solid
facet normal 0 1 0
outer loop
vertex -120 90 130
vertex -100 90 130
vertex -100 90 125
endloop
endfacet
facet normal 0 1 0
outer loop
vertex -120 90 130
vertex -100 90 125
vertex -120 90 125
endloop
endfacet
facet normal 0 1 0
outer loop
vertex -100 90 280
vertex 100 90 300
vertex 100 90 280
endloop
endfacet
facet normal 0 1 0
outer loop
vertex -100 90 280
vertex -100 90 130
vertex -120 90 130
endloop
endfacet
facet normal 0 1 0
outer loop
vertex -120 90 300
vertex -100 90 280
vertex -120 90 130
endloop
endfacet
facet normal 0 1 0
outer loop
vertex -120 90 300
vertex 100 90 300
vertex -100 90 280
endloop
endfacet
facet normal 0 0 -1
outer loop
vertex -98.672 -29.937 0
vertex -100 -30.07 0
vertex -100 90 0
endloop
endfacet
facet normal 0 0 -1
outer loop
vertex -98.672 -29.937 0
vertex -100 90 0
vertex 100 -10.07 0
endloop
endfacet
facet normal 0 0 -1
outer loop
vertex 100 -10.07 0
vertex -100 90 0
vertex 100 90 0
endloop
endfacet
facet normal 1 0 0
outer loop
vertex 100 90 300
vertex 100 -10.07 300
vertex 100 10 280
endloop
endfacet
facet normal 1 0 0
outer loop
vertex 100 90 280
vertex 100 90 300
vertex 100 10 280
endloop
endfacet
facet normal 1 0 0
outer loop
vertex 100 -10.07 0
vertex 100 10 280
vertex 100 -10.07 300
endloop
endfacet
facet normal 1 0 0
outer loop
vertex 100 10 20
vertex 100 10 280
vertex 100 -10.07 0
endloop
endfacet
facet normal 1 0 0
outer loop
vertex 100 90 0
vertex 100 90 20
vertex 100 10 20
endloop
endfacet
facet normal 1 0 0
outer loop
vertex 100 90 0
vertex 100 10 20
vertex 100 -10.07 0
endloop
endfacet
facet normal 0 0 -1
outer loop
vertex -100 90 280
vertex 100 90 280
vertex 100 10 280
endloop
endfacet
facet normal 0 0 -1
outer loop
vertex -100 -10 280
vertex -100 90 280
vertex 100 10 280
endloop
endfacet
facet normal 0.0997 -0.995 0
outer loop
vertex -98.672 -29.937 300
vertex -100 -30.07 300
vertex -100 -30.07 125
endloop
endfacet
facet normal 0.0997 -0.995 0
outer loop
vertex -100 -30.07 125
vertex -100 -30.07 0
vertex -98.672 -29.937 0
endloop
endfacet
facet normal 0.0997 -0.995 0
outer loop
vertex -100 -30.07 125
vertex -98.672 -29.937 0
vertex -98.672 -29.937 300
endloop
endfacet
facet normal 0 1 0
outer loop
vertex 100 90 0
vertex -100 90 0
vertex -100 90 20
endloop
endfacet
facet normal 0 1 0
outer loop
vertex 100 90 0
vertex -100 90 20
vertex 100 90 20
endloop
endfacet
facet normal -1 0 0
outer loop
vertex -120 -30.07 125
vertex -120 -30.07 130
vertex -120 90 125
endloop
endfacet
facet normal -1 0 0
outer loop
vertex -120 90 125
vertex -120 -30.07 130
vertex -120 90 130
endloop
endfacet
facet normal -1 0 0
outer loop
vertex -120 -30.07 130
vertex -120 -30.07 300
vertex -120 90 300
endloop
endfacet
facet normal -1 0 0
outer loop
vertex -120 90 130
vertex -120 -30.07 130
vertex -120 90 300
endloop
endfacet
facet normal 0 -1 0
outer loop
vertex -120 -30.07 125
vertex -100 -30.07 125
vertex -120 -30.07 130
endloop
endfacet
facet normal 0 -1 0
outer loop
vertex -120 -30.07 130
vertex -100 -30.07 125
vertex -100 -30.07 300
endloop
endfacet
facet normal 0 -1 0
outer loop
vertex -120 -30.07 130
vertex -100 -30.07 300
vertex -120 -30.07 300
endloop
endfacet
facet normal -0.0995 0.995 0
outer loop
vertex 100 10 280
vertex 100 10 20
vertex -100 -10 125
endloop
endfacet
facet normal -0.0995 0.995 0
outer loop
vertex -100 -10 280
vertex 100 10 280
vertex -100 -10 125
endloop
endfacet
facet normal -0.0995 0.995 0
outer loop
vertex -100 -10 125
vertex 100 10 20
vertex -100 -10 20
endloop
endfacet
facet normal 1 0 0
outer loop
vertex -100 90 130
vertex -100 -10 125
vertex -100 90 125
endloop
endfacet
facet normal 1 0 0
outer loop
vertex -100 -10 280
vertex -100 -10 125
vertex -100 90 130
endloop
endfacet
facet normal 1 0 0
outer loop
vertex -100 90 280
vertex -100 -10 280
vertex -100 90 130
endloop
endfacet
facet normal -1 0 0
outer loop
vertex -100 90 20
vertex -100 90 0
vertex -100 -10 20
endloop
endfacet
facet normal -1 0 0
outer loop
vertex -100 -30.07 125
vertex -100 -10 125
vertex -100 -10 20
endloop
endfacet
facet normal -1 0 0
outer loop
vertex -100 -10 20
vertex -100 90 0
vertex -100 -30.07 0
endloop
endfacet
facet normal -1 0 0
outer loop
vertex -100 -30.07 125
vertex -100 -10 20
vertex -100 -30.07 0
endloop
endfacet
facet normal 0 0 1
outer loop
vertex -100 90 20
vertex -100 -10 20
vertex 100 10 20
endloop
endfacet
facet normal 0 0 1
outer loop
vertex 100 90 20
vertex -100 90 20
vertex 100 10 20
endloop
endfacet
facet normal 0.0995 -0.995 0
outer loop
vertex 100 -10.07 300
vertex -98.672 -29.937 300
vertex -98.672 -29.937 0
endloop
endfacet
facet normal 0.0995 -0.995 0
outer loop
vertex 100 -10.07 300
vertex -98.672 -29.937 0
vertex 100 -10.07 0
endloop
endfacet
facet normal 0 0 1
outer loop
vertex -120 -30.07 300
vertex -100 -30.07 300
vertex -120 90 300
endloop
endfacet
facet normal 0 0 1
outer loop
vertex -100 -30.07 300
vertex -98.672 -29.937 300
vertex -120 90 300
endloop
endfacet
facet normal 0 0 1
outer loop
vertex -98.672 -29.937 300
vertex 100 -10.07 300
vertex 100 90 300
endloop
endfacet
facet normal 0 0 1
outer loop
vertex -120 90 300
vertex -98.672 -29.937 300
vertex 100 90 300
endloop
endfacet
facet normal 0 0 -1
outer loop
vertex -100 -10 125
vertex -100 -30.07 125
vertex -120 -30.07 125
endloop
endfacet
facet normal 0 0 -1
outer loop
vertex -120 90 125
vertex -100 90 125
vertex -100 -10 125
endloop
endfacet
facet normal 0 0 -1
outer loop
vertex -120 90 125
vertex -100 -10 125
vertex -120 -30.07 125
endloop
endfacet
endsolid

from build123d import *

# Parameters (mm, degrees)
BOSS_EXTRUDE1_DEPTH     = 300
SKETCH3_W               = 200
SKETCH3_H               = 20
BOSS_EXTRUDE3_DEPTH     = 90
CUT_EXTRUDE1_DEPTH      = 311.64449134
CUT_EXTRUDE1_DEPTH_BACK = 311.64449134
SKETCH5_W               = 200.997512422
SKETCH5_H               = 300
BOSS_EXTRUDE4_DEPTH     = 13.35
BOSS_EXTRUDE5_DEPTH     = 300
CUT_EXTRUDE2_START      = 100
CUT_EXTRUDE2_OUTLINE_W  = 16
CUT_EXTRUDE2_OUTLINE_H  = 302
CUT_EXTRUDE2_DEPTH      = 2
BOSS_EXTRUDE6_DEPTH     = 20
SKETCH9_W               = 20
SKETCH9_H               = 150
BOSS_EXTRUDE7_DEPTH     = 100
SKETCH10_W              = 20
SKETCH10_H              = 120.070032415
BOSS_EXTRUDE8_DEPTH     = 5


with BuildPart() as part:
    # Sketch2 → Boss-Extrude1 (new body)
    with BuildSketch(Plane.XY):
        Polygon((-100, -10), (-100, -16.653448461), (100, 3.346551539), (100, 10), align=None)
    extrude(amount=BOSS_EXTRUDE1_DEPTH)

    # Sketch3 → Boss-Extrude3 (add, symmetric)
    with BuildSketch(Plane(origin=(0, 0, 0), x_dir=(1, 0, 0), z_dir=(0, 1, 0))):
        with Locations((0, -10)):
            Rectangle(SKETCH3_W, SKETCH3_H)
        with Locations((0, -290)):
            Rectangle(SKETCH3_W, SKETCH3_H)
    extrude(amount=BOSS_EXTRUDE3_DEPTH, both=True)

    # Sketch4 → Cut-Extrude1 (cut, two sides: drawn at the far end of the back side and taken through both)
    with BuildSketch(Plane.XY.offset(20).offset(-CUT_EXTRUDE1_DEPTH_BACK)):
        Polygon((-100, -16.653448461), (-100, -90), (100, -90), (100, 3.346551539), align=None)
    extrude(amount=CUT_EXTRUDE1_DEPTH + CUT_EXTRUDE1_DEPTH_BACK, mode=Mode.SUBTRACT)

    # Sketch5 → Boss-Extrude4 (add)
    with BuildSketch(Plane(origin=(0.658757273, -6.587572734, 0), x_dir=(0.9950371902099892, 0.09950371902099911, 0), z_dir=(0.09950371902099912, -0.9950371902099893, 0))):
        with Locations((-0.662042866, 150)):
            Rectangle(SKETCH5_W, SKETCH5_H)
    extrude(amount=BOSS_EXTRUDE4_DEPTH)

    # Boss-Extrude5: read off the stored shape, not the designer's step
    # Boss-Extrude5 outline → Boss-Extrude5 (add)
    with BuildSketch(Plane.XY):
        Polygon((-100, -16.653448461), (-100, -30.070032415), (-98.671625351, -29.93719495), align=None)
    extrude(amount=BOSS_EXTRUDE5_DEPTH)

    # Cut-Extrude2: read off the stored shape, not the designer's step
    # Cut-Extrude2 outline → Cut-Extrude2 (cut)
    with BuildSketch(Plane.YZ.offset(CUT_EXTRUDE2_START)):
        with Locations((-3, 150)):
            Rectangle(CUT_EXTRUDE2_OUTLINE_W, CUT_EXTRUDE2_OUTLINE_H)
    extrude(amount=CUT_EXTRUDE2_DEPTH, mode=Mode.SUBTRACT)

    # Sketch8 → Boss-Extrude6 (add)
    with BuildSketch(Plane.ZY.offset(100)):
        Polygon((300, 90), (280, 90), (280, -10), (130, -10), (130, -30.070032415), (300, -30.070032415), align=None)
    extrude(amount=BOSS_EXTRUDE6_DEPTH)

    # Sketch9 → Boss-Extrude7 (add)
    with BuildSketch(Plane(origin=(0, -10, 0), x_dir=(1, 0, 0), z_dir=(0, 1, 0))):
        with Locations((-110, -205)):
            Rectangle(SKETCH9_W, SKETCH9_H)
    extrude(amount=BOSS_EXTRUDE7_DEPTH)

    # Sketch10 → Boss-Extrude8 (add)
    with BuildSketch(Plane(origin=(0, 0, 130), x_dir=(-1, 0, 0), z_dir=(0, 0, -1))):
        with Locations((110, 29.964983792)):
            Rectangle(SKETCH10_W, SKETCH10_H)
    extrude(amount=BOSS_EXTRUDE8_DEPTH)


solid = part.part
